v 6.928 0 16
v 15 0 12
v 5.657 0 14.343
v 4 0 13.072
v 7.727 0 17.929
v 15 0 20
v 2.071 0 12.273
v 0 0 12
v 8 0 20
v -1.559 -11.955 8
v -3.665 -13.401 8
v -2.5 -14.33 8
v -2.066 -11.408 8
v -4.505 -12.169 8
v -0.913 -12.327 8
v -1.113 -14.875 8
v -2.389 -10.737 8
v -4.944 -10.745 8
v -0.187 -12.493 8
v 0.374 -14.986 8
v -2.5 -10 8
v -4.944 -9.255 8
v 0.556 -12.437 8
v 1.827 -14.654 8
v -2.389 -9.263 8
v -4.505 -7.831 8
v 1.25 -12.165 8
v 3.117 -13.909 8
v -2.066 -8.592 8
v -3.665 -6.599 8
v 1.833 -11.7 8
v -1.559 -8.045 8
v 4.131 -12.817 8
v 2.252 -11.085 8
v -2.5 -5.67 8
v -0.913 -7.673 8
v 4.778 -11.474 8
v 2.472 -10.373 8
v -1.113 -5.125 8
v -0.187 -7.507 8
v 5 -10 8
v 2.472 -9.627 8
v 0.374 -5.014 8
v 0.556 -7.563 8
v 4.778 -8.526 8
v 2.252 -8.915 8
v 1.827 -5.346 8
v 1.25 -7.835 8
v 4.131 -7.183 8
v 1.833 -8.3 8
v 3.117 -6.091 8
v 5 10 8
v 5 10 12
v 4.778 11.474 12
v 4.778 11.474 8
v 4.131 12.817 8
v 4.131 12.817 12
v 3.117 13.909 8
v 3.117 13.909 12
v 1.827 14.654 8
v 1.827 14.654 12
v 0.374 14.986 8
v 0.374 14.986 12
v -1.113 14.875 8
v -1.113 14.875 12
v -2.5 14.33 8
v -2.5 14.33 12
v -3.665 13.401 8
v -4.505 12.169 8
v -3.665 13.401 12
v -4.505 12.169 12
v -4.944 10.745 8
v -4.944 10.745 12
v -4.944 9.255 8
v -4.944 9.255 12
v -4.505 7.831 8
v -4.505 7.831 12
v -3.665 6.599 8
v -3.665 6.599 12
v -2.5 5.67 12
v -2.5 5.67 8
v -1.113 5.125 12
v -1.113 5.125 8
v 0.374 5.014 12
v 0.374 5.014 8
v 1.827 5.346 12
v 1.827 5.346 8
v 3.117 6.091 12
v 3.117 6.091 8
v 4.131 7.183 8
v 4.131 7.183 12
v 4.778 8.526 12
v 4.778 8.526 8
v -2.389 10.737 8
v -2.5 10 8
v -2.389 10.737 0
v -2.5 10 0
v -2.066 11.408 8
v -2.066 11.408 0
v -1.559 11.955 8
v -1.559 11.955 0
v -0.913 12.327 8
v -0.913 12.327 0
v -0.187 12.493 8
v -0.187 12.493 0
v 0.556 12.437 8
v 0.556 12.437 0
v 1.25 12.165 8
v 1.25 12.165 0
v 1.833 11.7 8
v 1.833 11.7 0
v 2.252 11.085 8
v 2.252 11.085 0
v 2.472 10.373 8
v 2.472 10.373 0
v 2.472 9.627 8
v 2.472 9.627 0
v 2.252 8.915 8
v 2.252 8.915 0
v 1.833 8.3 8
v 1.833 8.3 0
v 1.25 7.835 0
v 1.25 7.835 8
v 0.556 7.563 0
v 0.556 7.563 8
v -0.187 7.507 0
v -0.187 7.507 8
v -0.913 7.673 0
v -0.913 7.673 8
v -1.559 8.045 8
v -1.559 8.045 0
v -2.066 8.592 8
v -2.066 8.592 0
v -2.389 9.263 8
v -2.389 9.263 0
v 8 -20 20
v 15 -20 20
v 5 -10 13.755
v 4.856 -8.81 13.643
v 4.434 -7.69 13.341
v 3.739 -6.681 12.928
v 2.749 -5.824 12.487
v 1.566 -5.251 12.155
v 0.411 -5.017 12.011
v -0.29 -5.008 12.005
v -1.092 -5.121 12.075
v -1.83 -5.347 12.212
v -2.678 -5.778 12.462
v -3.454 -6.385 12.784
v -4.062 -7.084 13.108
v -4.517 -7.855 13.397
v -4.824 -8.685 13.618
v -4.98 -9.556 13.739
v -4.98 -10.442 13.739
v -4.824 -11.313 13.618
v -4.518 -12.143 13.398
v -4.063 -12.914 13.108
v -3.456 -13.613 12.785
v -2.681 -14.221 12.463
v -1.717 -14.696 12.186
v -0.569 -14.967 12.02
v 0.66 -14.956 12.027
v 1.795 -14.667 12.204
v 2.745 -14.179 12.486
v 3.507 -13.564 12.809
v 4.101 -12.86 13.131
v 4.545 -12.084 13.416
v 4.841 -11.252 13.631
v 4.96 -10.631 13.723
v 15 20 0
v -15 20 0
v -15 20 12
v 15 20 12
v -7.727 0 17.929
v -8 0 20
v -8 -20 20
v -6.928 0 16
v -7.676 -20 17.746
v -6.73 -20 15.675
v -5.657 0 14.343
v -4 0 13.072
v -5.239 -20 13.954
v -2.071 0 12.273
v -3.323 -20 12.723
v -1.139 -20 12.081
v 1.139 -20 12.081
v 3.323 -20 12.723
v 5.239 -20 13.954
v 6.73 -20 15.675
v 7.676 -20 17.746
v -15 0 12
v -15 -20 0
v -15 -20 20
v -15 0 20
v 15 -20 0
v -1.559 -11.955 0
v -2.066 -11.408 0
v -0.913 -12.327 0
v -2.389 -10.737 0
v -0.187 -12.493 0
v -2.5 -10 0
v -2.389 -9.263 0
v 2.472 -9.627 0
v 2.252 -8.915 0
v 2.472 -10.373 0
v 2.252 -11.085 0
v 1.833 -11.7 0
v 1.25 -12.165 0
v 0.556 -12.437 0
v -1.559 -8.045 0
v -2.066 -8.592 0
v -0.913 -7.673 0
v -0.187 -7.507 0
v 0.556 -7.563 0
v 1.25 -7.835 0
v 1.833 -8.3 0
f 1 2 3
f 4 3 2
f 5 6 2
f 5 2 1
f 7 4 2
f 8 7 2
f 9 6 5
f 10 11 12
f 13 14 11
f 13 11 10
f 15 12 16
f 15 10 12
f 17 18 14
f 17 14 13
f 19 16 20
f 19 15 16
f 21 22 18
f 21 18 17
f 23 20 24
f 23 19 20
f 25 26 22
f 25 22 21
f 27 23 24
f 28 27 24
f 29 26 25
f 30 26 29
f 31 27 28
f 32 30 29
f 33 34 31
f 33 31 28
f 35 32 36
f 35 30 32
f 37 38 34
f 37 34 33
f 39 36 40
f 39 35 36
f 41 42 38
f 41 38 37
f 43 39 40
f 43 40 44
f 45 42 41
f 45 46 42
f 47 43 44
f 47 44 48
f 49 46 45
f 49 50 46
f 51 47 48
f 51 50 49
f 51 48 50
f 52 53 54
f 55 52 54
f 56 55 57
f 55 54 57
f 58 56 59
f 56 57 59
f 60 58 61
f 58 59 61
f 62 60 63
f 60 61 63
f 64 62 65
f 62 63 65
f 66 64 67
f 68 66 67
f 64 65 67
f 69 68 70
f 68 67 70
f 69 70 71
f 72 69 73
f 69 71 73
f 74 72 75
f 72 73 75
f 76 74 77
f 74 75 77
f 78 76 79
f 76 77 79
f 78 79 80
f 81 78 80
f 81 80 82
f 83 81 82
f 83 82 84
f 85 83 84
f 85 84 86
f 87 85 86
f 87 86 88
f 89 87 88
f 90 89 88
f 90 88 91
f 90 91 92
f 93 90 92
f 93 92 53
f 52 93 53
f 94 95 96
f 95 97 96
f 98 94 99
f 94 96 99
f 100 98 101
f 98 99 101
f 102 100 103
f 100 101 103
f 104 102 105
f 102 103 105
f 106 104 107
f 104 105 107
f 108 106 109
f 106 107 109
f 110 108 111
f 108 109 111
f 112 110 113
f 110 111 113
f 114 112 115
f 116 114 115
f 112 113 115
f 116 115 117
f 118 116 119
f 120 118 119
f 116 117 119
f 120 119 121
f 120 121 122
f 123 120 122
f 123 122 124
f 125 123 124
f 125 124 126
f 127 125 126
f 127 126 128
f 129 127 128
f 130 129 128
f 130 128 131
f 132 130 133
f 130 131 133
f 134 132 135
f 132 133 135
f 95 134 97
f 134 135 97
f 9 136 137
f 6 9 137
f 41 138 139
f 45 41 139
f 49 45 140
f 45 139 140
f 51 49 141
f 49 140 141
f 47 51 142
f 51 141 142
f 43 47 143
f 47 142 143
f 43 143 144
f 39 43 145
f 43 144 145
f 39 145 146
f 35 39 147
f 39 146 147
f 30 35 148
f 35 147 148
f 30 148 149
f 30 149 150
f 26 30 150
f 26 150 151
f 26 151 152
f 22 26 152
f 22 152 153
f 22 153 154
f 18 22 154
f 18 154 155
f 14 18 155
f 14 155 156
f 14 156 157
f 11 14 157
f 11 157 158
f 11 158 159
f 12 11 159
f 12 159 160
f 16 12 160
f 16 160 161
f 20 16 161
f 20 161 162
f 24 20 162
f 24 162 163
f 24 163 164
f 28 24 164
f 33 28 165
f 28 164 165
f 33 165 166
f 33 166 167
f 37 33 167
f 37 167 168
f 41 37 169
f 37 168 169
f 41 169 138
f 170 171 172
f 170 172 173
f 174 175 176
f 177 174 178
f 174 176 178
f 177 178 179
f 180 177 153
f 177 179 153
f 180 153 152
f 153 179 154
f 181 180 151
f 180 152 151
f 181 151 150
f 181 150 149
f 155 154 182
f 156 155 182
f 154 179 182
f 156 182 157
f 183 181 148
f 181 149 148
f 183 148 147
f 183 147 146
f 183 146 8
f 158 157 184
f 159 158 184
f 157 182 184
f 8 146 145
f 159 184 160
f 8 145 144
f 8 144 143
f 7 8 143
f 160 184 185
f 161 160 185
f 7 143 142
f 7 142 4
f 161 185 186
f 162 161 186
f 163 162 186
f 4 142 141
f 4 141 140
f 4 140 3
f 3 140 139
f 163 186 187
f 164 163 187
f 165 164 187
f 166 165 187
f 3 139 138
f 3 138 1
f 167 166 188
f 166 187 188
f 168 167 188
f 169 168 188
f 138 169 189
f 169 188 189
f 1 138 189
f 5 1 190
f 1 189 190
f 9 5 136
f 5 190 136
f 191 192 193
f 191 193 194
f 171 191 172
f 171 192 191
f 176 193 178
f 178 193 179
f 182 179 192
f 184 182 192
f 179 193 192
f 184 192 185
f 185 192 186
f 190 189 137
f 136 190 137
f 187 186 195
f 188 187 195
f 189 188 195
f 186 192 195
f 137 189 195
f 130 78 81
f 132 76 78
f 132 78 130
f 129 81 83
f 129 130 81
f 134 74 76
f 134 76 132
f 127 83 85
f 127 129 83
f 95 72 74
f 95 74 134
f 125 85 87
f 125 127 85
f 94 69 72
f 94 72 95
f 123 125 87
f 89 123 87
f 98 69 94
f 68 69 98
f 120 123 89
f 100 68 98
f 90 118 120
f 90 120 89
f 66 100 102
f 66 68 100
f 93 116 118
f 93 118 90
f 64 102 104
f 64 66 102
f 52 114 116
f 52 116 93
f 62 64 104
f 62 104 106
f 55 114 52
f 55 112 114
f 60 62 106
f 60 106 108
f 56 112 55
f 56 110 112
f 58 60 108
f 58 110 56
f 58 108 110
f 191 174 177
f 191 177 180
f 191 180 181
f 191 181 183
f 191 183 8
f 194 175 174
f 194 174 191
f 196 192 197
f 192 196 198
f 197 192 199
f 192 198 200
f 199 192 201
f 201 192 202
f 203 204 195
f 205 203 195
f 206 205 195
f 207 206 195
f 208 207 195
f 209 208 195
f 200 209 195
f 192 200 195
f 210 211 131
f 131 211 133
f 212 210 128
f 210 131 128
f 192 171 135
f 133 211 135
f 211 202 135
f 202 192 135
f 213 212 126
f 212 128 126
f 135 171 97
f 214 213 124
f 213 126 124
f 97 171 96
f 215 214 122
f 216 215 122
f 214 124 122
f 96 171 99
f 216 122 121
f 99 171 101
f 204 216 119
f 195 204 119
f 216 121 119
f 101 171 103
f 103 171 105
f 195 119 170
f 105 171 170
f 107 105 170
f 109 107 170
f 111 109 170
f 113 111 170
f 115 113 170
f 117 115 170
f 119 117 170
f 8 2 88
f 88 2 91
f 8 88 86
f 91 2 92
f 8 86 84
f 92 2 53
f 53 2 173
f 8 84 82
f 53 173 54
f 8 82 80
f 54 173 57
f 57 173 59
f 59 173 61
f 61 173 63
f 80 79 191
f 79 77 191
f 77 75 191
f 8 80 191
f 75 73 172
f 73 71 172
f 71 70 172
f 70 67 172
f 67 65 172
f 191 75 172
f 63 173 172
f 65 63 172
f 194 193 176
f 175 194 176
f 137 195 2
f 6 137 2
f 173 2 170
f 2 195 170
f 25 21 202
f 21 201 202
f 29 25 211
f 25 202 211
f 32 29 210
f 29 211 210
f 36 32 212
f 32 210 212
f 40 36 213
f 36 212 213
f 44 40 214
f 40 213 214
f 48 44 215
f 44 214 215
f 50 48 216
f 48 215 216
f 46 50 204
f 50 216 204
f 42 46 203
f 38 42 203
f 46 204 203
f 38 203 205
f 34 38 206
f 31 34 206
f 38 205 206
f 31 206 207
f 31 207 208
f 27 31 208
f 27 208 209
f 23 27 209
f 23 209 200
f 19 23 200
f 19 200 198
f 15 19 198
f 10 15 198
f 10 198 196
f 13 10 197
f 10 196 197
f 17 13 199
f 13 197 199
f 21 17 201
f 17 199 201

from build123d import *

# Parameters (mm, degrees)
F0_W           = 30
F0_H           = 40
F1_DEPTH       = 20
F7_D           = 5
F7_CBORE_D     = 10
F7_CBORE_DEPTH = 12
F8_DEPTH       = 40
F4_DEPTH       = 20


with BuildPart() as f1:
    # F0 (on Top) → F1 (new body)
    with BuildSketch(Plane.XY):
        Rectangle(F0_W, F0_H)
    extrude(amount=F1_DEPTH)

    # F7 (through all)
    with Locations(Plane.XY.offset(20)):
        with Locations((0, -10), (0, 10)):
            CounterBoreHole(F7_D / 2, F7_CBORE_D / 2, F7_CBORE_DEPTH)

    # F6 (on face) → F8 (cut)
    with BuildSketch(Plane.XZ.offset(20)):
        with BuildLine():
            ThreePointArc((-8, 20), (0, 12), (8, 20))
            Line((8, 20), (-8, 20))
        make_face()
        with BuildLine():
            Line((-8, 20), (8, 20))
            ThreePointArc((8, 20), (0, 28), (-8, 20))
        make_face()
    extrude(amount=-F8_DEPTH, mode=Mode.SUBTRACT)

    # F3 (on face) → F4 (cut)
    with BuildSketch(Plane(origin=(0, 20, 0), x_dir=(-1, 0, 0), z_dir=(0, 1, 0))):
        with BuildLine():
            ThreePointArc((8, 20), (5.6568542495, 14.3431457505), (0, 12))
            Line((0, 12), (15, 12))
            Line((15, 12), (15, 20))
            Line((15, 20), (8, 20))
        make_face()
        with BuildLine():
            Line((-15, 12), (0, 12))
            ThreePointArc((0, 12), (-5.6568542495, 14.3431457505), (-8, 20))
            Line((-8, 20), (-15, 20))
            Line((-15, 20), (-15, 12))
        make_face()
    extrude(amount=-F4_DEPTH, mode=Mode.SUBTRACT)


solid = f1.part
